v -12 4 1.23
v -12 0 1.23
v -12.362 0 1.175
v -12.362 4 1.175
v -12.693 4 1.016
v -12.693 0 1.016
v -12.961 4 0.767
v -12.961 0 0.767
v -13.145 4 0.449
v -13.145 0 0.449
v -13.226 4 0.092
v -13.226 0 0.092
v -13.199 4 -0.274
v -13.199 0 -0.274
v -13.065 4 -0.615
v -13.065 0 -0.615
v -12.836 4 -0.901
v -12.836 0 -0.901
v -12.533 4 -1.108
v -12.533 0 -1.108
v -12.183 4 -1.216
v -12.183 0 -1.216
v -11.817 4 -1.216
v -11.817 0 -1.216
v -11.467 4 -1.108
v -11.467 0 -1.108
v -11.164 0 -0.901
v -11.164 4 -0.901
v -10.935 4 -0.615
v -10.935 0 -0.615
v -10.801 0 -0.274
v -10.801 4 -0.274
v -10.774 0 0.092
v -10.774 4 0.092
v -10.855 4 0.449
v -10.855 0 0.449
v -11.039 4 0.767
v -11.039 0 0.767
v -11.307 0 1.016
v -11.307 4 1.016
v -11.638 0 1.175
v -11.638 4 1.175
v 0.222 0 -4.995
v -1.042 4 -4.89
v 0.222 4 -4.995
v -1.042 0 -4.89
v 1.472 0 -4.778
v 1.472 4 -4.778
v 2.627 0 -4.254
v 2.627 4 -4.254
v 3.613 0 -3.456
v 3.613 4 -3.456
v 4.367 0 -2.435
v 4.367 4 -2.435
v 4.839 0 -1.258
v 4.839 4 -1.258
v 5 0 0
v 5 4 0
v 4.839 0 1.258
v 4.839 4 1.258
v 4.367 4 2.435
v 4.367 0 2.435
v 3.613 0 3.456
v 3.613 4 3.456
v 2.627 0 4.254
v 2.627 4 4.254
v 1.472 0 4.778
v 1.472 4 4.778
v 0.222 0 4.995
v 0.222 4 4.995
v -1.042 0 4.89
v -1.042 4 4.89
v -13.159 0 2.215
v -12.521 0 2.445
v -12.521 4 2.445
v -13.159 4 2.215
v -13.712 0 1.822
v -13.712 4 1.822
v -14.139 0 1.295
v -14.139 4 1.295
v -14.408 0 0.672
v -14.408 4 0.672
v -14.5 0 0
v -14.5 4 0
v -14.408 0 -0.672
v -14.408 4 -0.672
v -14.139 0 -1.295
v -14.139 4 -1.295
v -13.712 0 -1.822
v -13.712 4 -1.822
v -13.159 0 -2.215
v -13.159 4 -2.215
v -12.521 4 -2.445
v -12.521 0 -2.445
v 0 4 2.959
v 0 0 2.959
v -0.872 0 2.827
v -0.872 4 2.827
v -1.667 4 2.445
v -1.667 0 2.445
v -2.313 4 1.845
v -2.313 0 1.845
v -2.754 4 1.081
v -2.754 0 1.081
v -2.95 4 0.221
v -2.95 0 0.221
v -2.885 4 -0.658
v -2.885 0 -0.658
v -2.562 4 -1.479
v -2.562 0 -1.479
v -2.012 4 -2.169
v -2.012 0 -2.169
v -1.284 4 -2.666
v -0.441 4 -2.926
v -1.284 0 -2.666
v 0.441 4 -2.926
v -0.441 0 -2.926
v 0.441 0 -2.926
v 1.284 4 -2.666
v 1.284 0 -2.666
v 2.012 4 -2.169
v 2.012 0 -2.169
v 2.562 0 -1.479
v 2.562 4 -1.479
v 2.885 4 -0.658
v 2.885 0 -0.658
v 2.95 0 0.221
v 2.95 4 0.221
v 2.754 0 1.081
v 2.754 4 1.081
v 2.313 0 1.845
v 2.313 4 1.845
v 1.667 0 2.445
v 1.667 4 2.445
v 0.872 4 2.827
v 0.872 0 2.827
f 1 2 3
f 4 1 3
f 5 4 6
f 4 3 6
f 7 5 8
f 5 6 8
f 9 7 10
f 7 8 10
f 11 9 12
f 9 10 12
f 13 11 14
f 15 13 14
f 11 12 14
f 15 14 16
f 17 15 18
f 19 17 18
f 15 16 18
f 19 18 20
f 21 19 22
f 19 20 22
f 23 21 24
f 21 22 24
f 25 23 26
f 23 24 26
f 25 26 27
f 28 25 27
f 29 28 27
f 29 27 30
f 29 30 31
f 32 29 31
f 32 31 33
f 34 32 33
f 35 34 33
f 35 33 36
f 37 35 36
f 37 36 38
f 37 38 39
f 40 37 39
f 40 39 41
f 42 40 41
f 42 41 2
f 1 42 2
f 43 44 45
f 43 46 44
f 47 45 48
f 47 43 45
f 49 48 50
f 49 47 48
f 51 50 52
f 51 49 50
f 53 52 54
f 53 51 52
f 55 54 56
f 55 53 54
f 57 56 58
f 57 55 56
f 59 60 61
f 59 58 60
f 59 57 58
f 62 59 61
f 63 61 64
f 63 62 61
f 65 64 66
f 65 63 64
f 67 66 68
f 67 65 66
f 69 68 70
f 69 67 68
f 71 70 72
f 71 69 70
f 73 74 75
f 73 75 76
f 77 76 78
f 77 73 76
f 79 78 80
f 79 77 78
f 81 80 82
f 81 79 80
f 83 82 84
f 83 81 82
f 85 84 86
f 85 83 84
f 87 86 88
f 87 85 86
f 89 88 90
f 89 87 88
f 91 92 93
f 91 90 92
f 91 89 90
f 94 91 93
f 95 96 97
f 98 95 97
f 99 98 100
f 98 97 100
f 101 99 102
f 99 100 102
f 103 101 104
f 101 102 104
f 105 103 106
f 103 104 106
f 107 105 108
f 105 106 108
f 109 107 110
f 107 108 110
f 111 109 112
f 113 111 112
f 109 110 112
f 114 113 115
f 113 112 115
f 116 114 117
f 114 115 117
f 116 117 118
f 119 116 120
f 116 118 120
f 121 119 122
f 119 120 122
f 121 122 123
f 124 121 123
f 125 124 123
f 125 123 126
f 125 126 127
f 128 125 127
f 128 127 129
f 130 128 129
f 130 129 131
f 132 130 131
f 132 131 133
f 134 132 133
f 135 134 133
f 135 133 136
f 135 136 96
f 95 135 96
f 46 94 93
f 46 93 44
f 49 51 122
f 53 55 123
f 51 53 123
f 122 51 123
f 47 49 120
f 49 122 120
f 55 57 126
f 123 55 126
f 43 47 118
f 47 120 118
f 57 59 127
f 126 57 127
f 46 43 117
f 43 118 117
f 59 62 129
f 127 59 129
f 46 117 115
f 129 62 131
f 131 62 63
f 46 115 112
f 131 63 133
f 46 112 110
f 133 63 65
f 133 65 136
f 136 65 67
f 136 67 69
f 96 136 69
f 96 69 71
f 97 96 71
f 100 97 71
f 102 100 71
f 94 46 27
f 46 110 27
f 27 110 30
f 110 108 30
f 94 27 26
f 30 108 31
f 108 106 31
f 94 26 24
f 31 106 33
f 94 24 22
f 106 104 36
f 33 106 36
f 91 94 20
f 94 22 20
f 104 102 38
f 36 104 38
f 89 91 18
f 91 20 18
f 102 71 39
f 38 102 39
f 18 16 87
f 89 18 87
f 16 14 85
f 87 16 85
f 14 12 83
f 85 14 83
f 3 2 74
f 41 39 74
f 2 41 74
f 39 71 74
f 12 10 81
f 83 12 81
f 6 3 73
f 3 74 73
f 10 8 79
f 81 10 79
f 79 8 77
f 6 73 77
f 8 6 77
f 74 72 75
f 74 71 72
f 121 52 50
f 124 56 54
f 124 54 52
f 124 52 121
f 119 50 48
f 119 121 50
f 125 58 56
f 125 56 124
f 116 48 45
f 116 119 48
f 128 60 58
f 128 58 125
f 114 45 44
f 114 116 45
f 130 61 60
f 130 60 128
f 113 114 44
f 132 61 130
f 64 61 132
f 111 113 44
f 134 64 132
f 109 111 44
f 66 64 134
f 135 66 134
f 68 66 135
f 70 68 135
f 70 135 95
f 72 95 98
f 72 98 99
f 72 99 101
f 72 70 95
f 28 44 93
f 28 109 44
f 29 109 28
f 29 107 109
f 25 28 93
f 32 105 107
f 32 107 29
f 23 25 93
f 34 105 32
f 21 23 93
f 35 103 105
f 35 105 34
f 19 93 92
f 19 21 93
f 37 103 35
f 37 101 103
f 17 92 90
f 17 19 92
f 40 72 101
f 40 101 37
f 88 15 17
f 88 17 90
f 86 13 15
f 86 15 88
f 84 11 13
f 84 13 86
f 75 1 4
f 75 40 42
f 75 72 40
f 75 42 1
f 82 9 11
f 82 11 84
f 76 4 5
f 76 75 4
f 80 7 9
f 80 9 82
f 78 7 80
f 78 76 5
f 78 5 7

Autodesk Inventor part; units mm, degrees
ref_plane "YZ Plane" through (0, 0, 0) normal (1, 0, 0) x (0, 1, 0)
ref_plane "XZ Plane" through (0, 0, 0) normal (0, 1, 0) x (-1, 0, 0)
ref_plane "XY Plane" through (0, 0, 0) normal (0, 0, 1) x (1, 0, 0)
sketch "Sketch1" plane through (0, 0, 0) normal (0, 1, 0) x (-1, 0, 0)
  arc A0 (12.5208, -2.4451) -> (12.5208, 2.4451) centre (12, 0) ccw
  arc A1 (1.0417, 4.8903) -> (1.0417, -4.8903) centre (0, 0) ccw
  line L0 (1.0417, 4.8903) -> (12.5208, 2.4451)
  line L1 (12.5208, -2.4451) -> (1.0417, -4.8903)
  dimension "d0" = 2.5
  dimension "d1" = 5
  dimension "d2" = 12
extrude "Extrusion1" add sketch "Sketch1" along normal blind 4
sketch "Sketch3" plane through (0, 4, 0) normal (0, 1, 0) x (1, 0, 0)
  arc A0 (-12.5208, 2.4451) -> (-12.5208, -2.4451) centre (-12, 0) ccw projected
  point P0 (0, 0)
hole "Hole2" at (-12, 4, 0) direction (0, -1, 0) diameter 2.459 end through all thread size "M3x0.5" class "6H" standard "ISO Metric profile"
sketch "Sketch4" plane through (0, 4, 0) normal (0, 1, 0) x (1, 0, 0)
  arc A0 (-1.0417, -4.8903) -> (-1.0417, 4.8903) centre (0, 0) ccw projected
hole "Hole3" at (0, 4, 0) direction (0, -1, 0) diameter 5.9175 end through all thread size "M7x1" class "6H" standard "ISO Metric profile"
properties part number "214.1"
